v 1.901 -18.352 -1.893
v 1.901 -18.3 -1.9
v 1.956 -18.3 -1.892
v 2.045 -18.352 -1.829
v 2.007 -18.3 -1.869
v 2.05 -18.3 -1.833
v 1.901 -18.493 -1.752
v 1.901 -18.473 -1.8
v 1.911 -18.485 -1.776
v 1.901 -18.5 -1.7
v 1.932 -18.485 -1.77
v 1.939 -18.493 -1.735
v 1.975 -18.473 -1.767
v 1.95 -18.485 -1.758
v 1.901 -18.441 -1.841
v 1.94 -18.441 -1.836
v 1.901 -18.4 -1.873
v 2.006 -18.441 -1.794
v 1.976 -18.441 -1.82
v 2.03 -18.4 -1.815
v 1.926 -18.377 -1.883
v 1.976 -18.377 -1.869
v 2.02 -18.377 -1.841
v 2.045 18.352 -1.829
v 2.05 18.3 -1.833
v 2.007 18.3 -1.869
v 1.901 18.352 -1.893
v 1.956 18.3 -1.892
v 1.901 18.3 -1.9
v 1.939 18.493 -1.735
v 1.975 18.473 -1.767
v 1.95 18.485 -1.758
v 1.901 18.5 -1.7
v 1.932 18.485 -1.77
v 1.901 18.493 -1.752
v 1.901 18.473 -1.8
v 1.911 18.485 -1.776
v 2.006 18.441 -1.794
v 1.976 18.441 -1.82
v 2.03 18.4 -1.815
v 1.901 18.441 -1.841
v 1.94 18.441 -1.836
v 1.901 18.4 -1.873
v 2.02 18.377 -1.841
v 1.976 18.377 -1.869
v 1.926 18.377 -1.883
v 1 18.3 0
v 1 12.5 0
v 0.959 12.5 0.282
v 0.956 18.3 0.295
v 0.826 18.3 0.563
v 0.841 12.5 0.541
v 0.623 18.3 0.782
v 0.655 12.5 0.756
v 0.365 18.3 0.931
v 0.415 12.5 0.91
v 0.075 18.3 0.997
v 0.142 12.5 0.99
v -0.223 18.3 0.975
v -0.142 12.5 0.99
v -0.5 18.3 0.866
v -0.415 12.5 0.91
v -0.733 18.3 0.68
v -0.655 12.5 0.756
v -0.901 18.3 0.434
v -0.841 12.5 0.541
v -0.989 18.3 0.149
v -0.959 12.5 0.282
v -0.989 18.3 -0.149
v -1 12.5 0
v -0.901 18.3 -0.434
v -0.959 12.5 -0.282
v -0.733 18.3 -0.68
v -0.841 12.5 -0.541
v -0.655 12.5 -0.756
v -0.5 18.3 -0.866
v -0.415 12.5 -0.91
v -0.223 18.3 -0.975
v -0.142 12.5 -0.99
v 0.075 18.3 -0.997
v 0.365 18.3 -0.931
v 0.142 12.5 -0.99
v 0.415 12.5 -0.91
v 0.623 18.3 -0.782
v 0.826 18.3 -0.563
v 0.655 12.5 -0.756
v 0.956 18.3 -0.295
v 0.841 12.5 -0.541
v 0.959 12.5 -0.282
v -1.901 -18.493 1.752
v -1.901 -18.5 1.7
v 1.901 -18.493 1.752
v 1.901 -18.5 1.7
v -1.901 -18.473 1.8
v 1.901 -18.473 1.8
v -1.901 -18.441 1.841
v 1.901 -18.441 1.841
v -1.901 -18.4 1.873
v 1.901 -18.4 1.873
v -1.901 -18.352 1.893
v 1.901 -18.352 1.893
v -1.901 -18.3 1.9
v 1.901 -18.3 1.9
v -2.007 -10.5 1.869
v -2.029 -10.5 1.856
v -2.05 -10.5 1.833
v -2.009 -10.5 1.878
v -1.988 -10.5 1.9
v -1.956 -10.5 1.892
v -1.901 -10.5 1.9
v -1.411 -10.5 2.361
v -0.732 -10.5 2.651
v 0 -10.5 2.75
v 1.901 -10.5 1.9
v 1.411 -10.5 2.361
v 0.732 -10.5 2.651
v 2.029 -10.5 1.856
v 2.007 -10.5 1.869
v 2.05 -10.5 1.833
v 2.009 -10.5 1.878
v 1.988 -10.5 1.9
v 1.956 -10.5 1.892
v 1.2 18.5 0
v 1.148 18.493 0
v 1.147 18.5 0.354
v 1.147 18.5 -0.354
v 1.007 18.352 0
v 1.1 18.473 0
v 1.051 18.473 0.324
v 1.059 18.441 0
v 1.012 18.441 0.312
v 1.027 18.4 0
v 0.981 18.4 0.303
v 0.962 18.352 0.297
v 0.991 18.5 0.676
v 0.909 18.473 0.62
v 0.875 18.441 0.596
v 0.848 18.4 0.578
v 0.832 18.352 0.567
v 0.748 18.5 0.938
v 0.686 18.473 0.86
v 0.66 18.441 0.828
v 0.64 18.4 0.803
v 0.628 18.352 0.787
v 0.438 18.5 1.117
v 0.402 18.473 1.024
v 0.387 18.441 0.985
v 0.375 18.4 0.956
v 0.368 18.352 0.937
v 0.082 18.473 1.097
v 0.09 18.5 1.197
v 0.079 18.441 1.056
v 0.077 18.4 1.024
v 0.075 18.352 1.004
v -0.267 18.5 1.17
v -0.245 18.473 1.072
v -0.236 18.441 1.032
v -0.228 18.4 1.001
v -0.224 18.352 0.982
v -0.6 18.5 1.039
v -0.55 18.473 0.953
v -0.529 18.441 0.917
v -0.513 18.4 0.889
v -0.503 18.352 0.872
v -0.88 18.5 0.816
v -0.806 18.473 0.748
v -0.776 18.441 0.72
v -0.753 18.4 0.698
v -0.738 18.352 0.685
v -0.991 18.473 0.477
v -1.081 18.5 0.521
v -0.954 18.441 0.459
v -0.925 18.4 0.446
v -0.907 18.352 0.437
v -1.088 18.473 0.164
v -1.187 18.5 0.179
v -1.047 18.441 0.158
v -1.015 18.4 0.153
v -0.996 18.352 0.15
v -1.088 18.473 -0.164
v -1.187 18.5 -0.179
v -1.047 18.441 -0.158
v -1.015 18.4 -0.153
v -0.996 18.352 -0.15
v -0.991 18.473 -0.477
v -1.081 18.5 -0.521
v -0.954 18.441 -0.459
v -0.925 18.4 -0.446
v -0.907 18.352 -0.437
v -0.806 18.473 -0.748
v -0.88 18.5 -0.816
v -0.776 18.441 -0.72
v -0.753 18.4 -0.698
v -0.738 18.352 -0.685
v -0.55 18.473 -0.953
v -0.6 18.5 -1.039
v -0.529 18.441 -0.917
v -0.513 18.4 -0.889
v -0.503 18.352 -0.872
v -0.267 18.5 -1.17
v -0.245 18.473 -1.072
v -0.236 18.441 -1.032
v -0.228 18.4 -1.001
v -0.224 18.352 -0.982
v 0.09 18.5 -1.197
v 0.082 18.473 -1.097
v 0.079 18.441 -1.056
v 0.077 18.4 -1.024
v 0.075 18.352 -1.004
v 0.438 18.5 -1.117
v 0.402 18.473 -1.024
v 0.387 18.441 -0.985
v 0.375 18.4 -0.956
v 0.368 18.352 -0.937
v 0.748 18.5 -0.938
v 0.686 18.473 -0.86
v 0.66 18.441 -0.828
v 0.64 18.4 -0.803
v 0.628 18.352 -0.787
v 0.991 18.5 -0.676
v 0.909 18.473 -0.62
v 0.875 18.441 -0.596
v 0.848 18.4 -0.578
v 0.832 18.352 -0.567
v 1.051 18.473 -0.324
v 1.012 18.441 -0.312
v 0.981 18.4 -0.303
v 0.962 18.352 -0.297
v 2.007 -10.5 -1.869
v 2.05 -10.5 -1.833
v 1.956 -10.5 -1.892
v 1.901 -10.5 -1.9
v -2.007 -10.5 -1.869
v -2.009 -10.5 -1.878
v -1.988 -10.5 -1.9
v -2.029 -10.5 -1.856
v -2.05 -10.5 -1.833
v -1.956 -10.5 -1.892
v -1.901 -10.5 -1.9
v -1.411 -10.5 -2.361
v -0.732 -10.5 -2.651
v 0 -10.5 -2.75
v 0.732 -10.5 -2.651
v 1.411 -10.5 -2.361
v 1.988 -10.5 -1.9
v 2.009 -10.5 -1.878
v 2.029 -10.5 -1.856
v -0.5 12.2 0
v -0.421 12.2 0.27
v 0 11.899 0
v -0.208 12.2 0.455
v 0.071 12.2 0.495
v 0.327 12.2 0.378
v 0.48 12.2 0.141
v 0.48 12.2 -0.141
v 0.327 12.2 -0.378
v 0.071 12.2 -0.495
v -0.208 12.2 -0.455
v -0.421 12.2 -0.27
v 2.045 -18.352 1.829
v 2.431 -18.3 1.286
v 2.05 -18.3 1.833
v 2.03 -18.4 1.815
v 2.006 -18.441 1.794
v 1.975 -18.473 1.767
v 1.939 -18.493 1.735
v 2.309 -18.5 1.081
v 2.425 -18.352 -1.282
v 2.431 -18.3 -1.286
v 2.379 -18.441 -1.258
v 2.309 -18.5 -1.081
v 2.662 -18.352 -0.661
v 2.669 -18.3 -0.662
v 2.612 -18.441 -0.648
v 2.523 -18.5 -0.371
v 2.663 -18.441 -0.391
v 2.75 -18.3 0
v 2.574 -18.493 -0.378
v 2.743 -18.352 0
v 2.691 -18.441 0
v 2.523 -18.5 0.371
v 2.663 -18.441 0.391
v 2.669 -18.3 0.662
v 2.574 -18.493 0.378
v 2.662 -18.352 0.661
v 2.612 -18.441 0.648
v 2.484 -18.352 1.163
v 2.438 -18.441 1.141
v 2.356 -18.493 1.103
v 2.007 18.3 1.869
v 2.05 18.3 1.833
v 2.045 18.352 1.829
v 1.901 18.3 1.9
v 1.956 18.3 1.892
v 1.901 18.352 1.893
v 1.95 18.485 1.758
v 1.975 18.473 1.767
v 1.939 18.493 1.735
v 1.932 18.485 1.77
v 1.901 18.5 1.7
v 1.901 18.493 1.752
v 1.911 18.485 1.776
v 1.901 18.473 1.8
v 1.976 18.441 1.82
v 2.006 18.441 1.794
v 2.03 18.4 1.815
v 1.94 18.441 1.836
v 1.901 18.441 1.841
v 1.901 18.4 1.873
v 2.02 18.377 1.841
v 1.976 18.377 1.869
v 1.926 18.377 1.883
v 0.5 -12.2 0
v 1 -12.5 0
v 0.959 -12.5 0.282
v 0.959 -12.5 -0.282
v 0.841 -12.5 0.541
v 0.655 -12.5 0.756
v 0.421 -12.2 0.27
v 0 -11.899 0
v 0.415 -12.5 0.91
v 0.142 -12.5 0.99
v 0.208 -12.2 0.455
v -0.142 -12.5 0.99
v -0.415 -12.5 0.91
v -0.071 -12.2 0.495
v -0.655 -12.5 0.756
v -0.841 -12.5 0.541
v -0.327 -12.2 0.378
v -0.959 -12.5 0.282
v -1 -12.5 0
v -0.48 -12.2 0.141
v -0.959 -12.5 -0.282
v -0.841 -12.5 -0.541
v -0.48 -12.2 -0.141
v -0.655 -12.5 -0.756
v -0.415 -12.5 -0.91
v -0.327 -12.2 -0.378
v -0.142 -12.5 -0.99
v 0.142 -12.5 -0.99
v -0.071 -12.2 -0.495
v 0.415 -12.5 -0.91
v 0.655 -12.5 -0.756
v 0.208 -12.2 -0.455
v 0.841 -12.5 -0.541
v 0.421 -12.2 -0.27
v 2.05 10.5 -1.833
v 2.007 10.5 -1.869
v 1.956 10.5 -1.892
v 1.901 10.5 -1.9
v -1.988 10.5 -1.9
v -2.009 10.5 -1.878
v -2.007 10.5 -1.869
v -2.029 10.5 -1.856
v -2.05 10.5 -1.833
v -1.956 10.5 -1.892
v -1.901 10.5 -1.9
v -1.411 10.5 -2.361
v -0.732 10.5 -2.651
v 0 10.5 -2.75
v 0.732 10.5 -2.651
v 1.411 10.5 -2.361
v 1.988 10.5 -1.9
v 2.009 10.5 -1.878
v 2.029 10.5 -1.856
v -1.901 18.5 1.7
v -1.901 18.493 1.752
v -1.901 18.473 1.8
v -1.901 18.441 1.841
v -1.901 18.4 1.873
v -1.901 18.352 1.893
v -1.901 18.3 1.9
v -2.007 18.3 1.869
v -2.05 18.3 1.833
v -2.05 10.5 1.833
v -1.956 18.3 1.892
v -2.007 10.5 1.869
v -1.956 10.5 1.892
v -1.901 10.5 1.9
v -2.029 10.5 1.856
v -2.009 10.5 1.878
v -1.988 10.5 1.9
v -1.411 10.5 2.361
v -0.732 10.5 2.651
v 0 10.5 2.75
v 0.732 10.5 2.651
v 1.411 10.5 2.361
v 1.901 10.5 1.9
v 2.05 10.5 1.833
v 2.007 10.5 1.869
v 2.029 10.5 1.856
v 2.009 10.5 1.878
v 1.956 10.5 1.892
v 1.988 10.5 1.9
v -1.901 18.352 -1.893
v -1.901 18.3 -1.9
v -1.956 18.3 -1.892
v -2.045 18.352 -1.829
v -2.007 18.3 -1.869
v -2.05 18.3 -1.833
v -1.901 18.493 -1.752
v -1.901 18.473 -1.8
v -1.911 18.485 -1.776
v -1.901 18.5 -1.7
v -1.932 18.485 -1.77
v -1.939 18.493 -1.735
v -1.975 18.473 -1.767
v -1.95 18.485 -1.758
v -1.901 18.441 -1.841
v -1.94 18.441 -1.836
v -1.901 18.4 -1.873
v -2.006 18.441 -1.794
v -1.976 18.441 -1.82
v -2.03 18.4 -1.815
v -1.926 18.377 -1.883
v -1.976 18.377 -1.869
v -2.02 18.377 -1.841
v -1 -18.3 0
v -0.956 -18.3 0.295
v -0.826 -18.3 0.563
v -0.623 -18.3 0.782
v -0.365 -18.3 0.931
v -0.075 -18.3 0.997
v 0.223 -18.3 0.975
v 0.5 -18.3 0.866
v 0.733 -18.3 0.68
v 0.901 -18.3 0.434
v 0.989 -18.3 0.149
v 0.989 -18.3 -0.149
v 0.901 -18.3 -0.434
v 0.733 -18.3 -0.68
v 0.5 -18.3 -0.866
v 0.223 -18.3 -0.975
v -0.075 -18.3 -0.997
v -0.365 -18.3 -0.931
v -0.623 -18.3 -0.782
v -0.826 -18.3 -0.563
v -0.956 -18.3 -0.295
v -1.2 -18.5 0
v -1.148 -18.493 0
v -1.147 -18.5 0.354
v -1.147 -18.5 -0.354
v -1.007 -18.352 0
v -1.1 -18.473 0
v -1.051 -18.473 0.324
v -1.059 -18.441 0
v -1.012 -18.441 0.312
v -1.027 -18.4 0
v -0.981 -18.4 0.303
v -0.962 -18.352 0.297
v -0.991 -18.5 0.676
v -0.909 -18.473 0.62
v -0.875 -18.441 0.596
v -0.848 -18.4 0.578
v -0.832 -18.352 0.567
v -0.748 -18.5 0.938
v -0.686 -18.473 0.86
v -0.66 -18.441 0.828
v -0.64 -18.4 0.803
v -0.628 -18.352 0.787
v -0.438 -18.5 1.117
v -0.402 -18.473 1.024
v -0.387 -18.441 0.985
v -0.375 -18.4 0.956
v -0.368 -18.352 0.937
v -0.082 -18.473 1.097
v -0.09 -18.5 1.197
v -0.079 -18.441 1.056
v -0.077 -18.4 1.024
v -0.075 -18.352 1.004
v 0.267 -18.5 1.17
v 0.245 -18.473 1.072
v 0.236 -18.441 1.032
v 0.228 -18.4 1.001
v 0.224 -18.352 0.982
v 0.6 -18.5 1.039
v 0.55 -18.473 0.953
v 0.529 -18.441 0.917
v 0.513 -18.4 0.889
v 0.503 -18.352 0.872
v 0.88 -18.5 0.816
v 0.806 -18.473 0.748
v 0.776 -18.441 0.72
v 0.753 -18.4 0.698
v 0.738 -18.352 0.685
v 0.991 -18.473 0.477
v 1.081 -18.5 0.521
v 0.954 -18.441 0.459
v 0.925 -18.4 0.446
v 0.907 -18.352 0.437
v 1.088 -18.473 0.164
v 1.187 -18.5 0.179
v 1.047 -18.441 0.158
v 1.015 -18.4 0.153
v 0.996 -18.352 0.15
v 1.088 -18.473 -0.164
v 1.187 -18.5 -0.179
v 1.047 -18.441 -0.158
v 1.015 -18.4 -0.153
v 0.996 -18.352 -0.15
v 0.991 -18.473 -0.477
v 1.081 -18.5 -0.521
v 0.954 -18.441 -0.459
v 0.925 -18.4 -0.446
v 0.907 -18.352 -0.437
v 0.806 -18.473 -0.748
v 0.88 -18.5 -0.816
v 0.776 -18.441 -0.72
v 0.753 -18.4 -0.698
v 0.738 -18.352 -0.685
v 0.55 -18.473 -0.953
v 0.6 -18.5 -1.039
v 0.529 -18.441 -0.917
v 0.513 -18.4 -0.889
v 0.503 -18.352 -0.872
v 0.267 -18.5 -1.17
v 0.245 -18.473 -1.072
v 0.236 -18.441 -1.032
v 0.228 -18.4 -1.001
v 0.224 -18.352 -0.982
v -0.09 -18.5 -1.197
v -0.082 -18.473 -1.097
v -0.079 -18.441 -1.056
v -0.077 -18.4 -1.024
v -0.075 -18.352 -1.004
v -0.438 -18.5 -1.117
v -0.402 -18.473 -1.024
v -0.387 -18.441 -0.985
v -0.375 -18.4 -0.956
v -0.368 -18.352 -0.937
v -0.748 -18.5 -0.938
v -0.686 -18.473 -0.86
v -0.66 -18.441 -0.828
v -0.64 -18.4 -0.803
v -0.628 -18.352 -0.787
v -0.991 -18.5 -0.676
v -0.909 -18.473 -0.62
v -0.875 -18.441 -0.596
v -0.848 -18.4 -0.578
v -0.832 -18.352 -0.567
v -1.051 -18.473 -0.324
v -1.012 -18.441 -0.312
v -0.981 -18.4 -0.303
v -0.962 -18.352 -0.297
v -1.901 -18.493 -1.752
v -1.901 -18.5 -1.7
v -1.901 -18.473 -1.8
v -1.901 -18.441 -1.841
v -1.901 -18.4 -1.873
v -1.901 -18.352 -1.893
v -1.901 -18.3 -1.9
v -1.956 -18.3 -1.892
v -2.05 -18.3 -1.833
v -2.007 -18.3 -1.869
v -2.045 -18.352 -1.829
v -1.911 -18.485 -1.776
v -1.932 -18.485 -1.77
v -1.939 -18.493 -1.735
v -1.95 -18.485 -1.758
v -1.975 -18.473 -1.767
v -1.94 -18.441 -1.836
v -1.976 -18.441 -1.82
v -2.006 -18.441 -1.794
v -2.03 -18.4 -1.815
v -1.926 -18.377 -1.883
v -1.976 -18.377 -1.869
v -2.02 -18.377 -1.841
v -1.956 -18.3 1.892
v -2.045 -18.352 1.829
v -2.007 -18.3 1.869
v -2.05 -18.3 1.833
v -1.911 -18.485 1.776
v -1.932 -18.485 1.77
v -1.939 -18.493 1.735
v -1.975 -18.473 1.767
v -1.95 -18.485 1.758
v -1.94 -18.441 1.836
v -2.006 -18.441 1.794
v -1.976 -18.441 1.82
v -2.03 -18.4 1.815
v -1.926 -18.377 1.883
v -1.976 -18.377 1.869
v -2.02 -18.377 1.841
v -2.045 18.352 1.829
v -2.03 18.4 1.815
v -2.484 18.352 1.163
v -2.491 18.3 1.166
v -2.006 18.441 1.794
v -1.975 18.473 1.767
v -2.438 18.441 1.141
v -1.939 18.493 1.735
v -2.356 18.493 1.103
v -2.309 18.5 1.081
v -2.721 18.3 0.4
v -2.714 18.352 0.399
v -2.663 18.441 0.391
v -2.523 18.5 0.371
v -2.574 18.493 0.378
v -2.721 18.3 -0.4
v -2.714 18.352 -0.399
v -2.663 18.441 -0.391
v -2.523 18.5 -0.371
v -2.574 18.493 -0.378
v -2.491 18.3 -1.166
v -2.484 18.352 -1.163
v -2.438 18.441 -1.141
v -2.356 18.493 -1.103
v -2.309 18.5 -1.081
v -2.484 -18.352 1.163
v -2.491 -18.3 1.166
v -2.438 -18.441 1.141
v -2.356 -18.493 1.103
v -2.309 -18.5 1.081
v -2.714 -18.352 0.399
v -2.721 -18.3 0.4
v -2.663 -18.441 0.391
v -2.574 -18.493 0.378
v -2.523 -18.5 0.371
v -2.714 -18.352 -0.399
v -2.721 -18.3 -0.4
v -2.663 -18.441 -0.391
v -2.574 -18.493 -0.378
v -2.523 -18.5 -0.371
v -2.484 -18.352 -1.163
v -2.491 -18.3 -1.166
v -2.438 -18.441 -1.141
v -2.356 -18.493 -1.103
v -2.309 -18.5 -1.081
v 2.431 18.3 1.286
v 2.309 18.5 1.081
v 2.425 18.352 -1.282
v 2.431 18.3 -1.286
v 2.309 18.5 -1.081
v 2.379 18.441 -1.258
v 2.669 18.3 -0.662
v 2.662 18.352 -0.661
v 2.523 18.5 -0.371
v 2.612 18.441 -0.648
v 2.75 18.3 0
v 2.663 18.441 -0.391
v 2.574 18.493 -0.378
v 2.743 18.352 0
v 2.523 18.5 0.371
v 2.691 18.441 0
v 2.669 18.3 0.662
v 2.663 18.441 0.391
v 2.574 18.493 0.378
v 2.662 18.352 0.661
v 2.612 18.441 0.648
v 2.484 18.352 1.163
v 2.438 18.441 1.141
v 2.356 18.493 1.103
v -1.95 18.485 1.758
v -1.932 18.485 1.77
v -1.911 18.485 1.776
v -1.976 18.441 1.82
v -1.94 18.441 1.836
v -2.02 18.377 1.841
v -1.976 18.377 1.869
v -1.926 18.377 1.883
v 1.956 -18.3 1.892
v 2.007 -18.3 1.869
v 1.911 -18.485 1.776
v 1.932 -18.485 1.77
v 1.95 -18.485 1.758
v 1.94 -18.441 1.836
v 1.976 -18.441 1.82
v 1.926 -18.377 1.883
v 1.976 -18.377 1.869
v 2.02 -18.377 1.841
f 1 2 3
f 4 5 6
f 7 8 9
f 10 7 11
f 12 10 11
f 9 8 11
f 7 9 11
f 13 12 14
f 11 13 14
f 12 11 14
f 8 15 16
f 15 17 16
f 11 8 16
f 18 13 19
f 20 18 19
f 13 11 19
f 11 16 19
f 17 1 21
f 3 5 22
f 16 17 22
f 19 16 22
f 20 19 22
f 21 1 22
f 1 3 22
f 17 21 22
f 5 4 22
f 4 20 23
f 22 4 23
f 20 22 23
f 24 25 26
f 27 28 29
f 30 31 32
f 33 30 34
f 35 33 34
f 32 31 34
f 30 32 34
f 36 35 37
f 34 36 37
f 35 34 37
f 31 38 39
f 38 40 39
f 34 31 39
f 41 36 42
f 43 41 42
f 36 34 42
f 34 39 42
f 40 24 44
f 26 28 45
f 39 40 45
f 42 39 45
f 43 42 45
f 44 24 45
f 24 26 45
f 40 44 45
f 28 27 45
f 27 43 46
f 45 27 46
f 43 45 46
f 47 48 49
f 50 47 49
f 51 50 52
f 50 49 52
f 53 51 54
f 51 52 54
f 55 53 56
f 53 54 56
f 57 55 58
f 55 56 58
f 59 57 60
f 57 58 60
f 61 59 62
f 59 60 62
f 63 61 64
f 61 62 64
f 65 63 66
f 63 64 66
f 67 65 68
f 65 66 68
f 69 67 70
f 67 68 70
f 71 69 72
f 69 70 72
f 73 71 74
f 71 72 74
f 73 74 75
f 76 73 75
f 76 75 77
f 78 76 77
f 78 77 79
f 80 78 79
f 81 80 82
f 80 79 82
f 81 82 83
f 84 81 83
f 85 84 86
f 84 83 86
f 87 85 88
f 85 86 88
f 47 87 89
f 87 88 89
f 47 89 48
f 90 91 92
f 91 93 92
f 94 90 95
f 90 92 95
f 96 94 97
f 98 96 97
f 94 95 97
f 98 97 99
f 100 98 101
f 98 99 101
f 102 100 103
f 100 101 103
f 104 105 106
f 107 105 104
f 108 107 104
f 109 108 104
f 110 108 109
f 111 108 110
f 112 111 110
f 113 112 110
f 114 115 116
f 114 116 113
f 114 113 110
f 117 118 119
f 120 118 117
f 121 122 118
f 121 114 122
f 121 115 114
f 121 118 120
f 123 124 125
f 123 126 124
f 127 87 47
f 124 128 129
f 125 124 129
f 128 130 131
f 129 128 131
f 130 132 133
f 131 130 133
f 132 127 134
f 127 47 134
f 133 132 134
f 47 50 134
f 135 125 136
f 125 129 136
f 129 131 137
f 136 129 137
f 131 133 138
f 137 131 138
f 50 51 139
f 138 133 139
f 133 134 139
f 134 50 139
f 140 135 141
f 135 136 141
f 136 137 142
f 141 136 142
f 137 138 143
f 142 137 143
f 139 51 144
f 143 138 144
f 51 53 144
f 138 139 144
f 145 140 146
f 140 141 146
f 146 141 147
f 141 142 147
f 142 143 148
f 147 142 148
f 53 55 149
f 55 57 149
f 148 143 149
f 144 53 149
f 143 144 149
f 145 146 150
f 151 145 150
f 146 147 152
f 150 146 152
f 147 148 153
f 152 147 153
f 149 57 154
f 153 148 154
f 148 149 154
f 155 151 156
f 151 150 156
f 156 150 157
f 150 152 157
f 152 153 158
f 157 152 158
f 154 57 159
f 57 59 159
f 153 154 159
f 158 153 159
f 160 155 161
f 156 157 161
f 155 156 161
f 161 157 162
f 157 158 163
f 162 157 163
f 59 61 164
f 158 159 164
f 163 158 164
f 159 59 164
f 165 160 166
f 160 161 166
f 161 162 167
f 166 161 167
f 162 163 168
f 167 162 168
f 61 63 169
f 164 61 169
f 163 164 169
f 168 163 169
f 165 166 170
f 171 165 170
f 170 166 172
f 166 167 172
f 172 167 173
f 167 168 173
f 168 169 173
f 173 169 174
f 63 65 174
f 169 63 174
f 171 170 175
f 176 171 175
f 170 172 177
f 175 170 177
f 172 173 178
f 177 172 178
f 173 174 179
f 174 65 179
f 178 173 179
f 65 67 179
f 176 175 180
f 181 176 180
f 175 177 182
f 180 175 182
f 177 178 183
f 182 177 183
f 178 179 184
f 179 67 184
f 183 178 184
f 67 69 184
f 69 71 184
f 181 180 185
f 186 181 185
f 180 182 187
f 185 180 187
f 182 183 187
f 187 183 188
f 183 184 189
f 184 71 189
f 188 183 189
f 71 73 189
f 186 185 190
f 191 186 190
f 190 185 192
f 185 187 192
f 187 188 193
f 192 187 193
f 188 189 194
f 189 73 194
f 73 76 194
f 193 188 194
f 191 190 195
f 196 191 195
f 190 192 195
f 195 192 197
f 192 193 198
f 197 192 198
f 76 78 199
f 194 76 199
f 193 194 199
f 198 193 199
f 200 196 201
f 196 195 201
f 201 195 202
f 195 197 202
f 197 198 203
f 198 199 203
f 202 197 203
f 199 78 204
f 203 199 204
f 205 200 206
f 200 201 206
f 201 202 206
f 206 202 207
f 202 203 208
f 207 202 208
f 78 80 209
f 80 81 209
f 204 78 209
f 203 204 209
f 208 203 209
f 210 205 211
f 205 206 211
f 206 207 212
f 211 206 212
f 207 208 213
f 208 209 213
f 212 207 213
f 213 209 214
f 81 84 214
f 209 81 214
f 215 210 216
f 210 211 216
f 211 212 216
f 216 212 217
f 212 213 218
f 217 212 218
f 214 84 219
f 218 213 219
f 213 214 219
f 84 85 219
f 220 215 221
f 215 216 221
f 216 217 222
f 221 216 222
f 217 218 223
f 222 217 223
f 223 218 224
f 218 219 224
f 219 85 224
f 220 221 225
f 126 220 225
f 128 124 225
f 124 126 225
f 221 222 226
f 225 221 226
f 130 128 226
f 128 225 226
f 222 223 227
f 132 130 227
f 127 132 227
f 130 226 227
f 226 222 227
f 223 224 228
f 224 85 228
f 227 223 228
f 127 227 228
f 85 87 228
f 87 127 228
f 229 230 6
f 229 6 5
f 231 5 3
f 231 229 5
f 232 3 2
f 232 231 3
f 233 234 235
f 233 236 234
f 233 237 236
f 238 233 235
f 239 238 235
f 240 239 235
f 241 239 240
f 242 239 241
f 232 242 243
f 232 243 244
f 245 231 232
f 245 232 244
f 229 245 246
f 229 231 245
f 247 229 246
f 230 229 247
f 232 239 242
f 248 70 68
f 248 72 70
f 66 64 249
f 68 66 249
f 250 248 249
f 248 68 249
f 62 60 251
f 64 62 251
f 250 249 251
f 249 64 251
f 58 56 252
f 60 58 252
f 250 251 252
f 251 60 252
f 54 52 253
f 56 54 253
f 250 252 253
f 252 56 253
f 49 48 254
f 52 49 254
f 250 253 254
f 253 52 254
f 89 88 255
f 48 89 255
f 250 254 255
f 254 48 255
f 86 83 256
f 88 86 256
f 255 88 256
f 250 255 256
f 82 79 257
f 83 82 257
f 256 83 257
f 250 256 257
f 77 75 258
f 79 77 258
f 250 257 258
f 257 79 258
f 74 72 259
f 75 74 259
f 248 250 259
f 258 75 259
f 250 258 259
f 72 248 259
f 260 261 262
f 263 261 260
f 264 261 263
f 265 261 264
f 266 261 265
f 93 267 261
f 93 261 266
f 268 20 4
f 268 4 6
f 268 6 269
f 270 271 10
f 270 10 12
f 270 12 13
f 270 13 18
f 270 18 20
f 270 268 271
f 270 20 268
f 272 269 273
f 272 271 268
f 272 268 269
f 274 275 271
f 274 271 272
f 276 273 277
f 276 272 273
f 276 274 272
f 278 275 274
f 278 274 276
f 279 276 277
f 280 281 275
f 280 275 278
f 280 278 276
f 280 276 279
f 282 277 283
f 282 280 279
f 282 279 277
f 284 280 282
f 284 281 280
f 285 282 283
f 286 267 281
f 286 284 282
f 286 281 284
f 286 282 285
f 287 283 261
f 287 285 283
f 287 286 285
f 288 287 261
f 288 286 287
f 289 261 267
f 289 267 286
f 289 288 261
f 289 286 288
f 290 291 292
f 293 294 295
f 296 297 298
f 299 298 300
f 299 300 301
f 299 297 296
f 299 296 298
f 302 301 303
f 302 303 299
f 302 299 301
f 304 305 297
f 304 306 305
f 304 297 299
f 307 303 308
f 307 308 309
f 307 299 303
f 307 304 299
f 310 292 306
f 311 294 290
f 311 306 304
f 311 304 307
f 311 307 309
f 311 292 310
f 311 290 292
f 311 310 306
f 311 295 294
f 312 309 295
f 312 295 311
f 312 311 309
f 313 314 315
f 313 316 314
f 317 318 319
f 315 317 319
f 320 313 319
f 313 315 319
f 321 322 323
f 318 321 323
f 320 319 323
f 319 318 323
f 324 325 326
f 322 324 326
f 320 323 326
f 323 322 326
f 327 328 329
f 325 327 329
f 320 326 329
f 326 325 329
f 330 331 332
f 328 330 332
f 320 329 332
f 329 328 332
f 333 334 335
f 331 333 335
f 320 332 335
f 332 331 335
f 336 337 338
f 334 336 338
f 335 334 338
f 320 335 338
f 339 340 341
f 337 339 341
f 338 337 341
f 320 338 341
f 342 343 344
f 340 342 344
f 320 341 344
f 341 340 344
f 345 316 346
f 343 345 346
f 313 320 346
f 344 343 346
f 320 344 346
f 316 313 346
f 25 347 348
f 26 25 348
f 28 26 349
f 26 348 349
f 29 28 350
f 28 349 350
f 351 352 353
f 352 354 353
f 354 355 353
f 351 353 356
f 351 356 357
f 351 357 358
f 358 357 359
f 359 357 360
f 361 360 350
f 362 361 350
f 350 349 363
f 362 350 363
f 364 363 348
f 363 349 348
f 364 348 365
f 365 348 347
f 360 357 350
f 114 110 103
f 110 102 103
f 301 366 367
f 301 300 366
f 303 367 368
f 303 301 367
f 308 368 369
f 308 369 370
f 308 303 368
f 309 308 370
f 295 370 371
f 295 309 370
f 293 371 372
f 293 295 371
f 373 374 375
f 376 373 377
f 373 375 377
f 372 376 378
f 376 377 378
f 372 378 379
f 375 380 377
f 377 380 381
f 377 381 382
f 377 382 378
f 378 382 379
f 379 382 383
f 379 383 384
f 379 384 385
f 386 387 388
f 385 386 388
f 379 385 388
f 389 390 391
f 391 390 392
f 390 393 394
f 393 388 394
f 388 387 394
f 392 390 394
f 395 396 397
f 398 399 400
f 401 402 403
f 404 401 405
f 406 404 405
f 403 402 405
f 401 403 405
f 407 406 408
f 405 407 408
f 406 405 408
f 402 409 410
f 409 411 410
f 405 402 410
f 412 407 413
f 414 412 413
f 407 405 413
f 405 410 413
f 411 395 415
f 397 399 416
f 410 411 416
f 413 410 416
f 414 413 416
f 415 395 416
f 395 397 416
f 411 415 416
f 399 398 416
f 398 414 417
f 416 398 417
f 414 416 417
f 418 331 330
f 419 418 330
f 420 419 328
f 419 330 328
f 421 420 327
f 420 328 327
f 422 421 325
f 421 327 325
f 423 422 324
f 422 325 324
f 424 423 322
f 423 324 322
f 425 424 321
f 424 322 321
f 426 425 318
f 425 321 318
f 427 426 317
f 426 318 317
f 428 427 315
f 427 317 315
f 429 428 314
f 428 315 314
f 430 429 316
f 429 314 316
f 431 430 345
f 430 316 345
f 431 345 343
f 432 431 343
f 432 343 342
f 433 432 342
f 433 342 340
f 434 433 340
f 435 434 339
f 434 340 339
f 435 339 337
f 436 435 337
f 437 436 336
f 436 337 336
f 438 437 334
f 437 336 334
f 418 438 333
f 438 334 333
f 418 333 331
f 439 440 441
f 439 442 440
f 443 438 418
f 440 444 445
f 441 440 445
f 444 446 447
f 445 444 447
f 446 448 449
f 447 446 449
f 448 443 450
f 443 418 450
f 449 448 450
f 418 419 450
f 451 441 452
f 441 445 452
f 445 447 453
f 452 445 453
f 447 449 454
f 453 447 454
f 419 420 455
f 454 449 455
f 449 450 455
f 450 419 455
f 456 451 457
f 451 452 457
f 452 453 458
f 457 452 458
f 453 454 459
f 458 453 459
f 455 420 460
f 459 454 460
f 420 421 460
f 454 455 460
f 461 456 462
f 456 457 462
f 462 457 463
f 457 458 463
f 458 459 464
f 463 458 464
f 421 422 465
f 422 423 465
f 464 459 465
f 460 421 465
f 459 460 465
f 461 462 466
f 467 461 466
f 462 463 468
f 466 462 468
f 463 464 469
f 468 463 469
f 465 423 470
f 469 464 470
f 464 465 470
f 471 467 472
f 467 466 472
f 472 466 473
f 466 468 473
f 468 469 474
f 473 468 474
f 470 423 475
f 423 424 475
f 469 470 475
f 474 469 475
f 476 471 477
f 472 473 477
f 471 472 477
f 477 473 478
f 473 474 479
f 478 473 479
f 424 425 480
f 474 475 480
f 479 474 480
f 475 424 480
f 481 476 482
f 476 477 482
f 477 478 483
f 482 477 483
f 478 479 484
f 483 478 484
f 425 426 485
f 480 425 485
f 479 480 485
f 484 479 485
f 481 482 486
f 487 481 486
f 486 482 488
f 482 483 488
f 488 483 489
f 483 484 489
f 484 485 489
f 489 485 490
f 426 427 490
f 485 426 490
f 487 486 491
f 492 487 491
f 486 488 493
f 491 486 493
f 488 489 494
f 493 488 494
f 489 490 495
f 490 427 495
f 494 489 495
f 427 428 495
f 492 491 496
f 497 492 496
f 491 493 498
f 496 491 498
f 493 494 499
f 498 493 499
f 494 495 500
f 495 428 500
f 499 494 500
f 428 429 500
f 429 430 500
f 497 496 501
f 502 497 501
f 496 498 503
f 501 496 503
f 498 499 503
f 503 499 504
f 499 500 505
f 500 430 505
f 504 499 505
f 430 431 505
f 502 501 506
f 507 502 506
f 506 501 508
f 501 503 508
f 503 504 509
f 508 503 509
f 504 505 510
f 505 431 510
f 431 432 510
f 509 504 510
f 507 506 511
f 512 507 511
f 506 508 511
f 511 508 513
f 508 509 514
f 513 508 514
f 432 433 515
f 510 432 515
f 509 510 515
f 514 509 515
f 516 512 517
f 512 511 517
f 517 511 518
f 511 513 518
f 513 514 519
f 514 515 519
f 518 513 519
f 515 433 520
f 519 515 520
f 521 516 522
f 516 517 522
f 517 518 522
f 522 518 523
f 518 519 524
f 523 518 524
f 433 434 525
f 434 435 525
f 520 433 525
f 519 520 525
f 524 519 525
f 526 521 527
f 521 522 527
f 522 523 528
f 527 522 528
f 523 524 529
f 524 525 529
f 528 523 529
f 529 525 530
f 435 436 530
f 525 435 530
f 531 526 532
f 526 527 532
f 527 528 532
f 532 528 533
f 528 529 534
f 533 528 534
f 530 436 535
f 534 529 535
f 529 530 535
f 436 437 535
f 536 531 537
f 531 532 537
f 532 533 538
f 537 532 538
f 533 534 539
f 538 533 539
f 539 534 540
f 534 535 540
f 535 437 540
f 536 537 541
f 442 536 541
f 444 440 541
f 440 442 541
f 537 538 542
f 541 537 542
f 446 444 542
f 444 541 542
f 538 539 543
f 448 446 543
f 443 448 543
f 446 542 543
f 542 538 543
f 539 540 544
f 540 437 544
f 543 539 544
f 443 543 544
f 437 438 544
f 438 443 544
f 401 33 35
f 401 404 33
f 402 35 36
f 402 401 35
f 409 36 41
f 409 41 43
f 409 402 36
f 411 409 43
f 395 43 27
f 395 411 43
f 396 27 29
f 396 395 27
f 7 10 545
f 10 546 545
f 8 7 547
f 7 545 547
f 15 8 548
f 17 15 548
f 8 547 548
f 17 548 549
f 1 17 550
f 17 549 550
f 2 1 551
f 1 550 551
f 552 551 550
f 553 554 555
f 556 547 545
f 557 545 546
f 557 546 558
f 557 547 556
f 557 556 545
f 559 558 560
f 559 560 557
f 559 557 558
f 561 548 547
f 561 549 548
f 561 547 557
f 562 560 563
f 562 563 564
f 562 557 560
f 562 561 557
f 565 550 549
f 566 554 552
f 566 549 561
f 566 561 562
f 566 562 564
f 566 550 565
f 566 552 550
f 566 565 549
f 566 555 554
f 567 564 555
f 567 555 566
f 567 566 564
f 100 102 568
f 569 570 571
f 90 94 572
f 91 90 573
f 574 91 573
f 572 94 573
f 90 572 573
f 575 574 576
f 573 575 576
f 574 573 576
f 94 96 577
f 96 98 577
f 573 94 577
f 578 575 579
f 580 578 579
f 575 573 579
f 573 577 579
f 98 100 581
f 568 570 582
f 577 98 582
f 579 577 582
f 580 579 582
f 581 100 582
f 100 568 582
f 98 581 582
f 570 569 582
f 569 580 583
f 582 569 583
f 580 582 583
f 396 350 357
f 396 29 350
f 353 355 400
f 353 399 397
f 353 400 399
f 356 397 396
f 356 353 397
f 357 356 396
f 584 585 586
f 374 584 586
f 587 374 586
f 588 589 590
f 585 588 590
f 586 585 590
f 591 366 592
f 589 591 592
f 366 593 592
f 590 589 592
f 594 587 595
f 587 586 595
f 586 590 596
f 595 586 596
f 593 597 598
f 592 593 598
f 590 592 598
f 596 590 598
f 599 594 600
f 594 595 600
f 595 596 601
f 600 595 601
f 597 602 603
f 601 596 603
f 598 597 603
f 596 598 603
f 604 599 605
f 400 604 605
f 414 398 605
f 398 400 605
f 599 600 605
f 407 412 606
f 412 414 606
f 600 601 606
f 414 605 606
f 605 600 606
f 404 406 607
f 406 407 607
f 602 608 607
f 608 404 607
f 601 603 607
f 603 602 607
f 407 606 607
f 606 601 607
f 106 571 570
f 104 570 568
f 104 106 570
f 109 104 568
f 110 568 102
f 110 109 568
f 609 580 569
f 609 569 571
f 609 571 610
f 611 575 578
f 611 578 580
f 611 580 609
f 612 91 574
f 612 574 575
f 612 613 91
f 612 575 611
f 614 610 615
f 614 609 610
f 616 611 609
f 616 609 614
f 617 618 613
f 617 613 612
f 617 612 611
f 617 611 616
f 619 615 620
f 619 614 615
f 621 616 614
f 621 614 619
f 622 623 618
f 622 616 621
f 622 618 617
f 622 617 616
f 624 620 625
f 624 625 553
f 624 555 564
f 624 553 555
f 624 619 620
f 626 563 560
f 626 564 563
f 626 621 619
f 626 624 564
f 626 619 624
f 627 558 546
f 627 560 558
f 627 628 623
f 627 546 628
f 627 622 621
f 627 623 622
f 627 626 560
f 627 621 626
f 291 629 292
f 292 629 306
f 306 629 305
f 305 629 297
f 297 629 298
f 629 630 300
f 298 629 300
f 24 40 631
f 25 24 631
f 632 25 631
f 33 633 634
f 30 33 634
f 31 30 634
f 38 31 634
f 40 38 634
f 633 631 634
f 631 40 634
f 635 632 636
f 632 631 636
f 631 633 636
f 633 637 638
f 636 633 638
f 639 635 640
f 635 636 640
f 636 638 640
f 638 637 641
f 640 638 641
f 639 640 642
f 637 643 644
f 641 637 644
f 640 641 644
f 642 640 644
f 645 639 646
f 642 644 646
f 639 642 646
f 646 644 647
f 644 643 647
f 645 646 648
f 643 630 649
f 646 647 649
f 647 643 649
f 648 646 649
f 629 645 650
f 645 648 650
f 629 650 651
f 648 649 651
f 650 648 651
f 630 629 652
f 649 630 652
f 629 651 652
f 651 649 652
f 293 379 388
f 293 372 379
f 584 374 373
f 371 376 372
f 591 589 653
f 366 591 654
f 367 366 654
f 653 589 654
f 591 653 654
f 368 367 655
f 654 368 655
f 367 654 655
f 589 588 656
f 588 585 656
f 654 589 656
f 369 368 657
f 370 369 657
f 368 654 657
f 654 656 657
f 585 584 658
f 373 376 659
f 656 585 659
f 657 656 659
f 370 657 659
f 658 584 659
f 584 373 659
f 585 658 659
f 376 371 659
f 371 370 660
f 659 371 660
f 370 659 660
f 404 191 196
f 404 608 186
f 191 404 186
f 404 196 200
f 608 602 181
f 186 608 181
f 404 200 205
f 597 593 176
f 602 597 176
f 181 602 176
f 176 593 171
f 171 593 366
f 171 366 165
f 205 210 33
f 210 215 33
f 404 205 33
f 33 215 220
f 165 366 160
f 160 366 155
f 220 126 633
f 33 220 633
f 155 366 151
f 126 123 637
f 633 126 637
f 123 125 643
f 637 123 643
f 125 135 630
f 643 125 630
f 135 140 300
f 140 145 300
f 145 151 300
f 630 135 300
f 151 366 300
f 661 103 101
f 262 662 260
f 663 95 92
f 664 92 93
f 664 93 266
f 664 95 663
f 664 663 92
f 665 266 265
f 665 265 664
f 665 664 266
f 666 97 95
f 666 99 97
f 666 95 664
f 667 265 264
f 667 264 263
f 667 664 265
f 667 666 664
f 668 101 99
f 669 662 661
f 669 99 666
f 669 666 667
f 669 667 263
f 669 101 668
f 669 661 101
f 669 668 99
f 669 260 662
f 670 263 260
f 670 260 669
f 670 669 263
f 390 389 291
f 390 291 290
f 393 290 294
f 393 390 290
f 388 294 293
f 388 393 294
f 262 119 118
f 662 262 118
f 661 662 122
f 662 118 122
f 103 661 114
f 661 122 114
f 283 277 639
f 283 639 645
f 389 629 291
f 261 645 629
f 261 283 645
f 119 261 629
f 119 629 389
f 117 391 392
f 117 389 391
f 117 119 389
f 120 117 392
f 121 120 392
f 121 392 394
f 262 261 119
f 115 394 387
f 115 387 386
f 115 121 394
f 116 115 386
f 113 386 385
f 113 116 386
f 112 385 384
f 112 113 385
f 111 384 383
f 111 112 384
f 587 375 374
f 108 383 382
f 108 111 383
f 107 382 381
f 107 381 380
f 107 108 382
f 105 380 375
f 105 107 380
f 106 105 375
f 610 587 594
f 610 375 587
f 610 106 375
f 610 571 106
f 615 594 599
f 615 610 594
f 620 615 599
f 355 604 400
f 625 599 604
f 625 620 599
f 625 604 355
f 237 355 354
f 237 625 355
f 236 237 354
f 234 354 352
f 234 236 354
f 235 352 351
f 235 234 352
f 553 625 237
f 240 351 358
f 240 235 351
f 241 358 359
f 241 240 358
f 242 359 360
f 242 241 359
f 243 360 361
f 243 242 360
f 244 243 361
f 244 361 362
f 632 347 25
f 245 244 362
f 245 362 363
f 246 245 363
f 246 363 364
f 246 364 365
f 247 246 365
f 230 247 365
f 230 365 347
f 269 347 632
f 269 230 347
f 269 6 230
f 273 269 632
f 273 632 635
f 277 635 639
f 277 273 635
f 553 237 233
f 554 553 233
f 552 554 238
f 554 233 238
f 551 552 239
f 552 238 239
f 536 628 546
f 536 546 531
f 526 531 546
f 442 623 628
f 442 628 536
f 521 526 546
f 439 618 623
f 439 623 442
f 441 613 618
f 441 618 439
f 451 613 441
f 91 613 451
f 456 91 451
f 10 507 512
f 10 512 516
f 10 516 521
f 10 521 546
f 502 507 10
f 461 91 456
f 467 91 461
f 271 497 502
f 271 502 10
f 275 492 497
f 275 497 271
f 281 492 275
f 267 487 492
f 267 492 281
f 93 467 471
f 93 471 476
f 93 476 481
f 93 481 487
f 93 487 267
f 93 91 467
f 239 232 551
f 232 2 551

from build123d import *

# Parameters (mm, degrees)
F0_R           = 2.75
F1_DEPTH       = 18.5
F3_DEPTH       = 8
F7_D           = 2
F7_DEPTH       = 6
F7_TIP         = 0.600860619
F7_ON_F5_D     = 2
F7_ON_F5_DEPTH = 6
F7_ON_F5_TIP   = 0.600860619
F8_R           = 0.2


with BuildPart() as f1:
    # F0 (on Front) → F1 (new body, symmetric)
    with BuildSketch(Plane.XZ):
        Circle(F0_R)
    extrude(amount=F1_DEPTH, both=True)

    # F2 (on face) → F3 (cut)
    with BuildSketch(Plane.XZ.offset(18.5)):
        with BuildLine():
            ThreePointArc((1.9880895352, 1.9), (1.0810874155, 2.5285865617), (0, 2.75))
            ThreePointArc((0, 2.75), (-1.0810874155, 2.5285865617), (-1.9880895352, 1.9))
            Line((-1.9880895352, 1.9), (1.9880895352, 1.9))
        make_face()
        with BuildLine():
            Line((1.9880895352, -1.9), (-1.9880895352, -1.9))
            ThreePointArc((-1.9880895352, -1.9), (-1.0810874155, -2.5285865617), (0, -2.75))
            ThreePointArc((0, -2.75), (1.0810874155, -2.5285865617), (1.9880895352, -1.9))
        make_face()
    extrude(amount=-F3_DEPTH, mode=Mode.SUBTRACT)

    # F4: F1 across plane


with BuildPart() as f1_1:
    add(f1.part)
    add(f1.part.mirror(Plane.XZ), mode=Mode.INTERSECT)

    # F7
    with Locations(Plane(origin=(0, 18.5, 0), x_dir=(-1, 0, 0), z_dir=(0, 1, 0))):
        with Locations((0, 0)):
            Hole(F7_D / 2, depth=F7_DEPTH)
            with Locations((0, 0, -(F7_DEPTH + F7_TIP / 2))):  # 118° drill point
                Cone(0, F7_D / 2, F7_TIP, mode=Mode.SUBTRACT)

    # F7 on F5
    with Locations(Plane.XZ.offset(18.5)):
        with Locations((0, 0)):
            Hole(F7_ON_F5_D / 2, depth=F7_ON_F5_DEPTH)
            with Locations((0, 0, -(F7_ON_F5_DEPTH + F7_ON_F5_TIP / 2))):  # 118° drill point
                Cone(0, F7_ON_F5_D / 2, F7_ON_F5_TIP, mode=Mode.SUBTRACT)

    # F8
    f8_edges = [f1_1.edges().sort_by_distance(p)[0] for p in [
        (2.552425, -18.5, 1.023536),
        (-2.75, -18.5, 0),
        (2.552425, -18.5, -1.023536),
        (-1.98809, -14.5, -1.9),
        (1.98809, -14.5, -1.9),
        (1.98809, -14.5, 1.9),
        (-1.98809, -14.5, 1.9),
        (0, -18.5, -1.9),
        (0, -18.5, 1.9),
        (1.98809, 14.5, 1.9),
        (-1.98809, 14.5, 1.9),
        (-1.98809, 14.5, -1.9),
        (1.98809, 14.5, -1.9),
        (2.552425, 18.5, -1.023536),
        (0, 18.5, -1.9),
        (2.552425, 18.5, 1.023536),
        (-2.75, 18.5, 0),
        (0, 18.5, 1.9),
        (1, 18.5, 0),
        (-1, -18.5, 0),
    ]]
    fillet(f8_edges, radius=F8_R)


solid = f1_1.part
